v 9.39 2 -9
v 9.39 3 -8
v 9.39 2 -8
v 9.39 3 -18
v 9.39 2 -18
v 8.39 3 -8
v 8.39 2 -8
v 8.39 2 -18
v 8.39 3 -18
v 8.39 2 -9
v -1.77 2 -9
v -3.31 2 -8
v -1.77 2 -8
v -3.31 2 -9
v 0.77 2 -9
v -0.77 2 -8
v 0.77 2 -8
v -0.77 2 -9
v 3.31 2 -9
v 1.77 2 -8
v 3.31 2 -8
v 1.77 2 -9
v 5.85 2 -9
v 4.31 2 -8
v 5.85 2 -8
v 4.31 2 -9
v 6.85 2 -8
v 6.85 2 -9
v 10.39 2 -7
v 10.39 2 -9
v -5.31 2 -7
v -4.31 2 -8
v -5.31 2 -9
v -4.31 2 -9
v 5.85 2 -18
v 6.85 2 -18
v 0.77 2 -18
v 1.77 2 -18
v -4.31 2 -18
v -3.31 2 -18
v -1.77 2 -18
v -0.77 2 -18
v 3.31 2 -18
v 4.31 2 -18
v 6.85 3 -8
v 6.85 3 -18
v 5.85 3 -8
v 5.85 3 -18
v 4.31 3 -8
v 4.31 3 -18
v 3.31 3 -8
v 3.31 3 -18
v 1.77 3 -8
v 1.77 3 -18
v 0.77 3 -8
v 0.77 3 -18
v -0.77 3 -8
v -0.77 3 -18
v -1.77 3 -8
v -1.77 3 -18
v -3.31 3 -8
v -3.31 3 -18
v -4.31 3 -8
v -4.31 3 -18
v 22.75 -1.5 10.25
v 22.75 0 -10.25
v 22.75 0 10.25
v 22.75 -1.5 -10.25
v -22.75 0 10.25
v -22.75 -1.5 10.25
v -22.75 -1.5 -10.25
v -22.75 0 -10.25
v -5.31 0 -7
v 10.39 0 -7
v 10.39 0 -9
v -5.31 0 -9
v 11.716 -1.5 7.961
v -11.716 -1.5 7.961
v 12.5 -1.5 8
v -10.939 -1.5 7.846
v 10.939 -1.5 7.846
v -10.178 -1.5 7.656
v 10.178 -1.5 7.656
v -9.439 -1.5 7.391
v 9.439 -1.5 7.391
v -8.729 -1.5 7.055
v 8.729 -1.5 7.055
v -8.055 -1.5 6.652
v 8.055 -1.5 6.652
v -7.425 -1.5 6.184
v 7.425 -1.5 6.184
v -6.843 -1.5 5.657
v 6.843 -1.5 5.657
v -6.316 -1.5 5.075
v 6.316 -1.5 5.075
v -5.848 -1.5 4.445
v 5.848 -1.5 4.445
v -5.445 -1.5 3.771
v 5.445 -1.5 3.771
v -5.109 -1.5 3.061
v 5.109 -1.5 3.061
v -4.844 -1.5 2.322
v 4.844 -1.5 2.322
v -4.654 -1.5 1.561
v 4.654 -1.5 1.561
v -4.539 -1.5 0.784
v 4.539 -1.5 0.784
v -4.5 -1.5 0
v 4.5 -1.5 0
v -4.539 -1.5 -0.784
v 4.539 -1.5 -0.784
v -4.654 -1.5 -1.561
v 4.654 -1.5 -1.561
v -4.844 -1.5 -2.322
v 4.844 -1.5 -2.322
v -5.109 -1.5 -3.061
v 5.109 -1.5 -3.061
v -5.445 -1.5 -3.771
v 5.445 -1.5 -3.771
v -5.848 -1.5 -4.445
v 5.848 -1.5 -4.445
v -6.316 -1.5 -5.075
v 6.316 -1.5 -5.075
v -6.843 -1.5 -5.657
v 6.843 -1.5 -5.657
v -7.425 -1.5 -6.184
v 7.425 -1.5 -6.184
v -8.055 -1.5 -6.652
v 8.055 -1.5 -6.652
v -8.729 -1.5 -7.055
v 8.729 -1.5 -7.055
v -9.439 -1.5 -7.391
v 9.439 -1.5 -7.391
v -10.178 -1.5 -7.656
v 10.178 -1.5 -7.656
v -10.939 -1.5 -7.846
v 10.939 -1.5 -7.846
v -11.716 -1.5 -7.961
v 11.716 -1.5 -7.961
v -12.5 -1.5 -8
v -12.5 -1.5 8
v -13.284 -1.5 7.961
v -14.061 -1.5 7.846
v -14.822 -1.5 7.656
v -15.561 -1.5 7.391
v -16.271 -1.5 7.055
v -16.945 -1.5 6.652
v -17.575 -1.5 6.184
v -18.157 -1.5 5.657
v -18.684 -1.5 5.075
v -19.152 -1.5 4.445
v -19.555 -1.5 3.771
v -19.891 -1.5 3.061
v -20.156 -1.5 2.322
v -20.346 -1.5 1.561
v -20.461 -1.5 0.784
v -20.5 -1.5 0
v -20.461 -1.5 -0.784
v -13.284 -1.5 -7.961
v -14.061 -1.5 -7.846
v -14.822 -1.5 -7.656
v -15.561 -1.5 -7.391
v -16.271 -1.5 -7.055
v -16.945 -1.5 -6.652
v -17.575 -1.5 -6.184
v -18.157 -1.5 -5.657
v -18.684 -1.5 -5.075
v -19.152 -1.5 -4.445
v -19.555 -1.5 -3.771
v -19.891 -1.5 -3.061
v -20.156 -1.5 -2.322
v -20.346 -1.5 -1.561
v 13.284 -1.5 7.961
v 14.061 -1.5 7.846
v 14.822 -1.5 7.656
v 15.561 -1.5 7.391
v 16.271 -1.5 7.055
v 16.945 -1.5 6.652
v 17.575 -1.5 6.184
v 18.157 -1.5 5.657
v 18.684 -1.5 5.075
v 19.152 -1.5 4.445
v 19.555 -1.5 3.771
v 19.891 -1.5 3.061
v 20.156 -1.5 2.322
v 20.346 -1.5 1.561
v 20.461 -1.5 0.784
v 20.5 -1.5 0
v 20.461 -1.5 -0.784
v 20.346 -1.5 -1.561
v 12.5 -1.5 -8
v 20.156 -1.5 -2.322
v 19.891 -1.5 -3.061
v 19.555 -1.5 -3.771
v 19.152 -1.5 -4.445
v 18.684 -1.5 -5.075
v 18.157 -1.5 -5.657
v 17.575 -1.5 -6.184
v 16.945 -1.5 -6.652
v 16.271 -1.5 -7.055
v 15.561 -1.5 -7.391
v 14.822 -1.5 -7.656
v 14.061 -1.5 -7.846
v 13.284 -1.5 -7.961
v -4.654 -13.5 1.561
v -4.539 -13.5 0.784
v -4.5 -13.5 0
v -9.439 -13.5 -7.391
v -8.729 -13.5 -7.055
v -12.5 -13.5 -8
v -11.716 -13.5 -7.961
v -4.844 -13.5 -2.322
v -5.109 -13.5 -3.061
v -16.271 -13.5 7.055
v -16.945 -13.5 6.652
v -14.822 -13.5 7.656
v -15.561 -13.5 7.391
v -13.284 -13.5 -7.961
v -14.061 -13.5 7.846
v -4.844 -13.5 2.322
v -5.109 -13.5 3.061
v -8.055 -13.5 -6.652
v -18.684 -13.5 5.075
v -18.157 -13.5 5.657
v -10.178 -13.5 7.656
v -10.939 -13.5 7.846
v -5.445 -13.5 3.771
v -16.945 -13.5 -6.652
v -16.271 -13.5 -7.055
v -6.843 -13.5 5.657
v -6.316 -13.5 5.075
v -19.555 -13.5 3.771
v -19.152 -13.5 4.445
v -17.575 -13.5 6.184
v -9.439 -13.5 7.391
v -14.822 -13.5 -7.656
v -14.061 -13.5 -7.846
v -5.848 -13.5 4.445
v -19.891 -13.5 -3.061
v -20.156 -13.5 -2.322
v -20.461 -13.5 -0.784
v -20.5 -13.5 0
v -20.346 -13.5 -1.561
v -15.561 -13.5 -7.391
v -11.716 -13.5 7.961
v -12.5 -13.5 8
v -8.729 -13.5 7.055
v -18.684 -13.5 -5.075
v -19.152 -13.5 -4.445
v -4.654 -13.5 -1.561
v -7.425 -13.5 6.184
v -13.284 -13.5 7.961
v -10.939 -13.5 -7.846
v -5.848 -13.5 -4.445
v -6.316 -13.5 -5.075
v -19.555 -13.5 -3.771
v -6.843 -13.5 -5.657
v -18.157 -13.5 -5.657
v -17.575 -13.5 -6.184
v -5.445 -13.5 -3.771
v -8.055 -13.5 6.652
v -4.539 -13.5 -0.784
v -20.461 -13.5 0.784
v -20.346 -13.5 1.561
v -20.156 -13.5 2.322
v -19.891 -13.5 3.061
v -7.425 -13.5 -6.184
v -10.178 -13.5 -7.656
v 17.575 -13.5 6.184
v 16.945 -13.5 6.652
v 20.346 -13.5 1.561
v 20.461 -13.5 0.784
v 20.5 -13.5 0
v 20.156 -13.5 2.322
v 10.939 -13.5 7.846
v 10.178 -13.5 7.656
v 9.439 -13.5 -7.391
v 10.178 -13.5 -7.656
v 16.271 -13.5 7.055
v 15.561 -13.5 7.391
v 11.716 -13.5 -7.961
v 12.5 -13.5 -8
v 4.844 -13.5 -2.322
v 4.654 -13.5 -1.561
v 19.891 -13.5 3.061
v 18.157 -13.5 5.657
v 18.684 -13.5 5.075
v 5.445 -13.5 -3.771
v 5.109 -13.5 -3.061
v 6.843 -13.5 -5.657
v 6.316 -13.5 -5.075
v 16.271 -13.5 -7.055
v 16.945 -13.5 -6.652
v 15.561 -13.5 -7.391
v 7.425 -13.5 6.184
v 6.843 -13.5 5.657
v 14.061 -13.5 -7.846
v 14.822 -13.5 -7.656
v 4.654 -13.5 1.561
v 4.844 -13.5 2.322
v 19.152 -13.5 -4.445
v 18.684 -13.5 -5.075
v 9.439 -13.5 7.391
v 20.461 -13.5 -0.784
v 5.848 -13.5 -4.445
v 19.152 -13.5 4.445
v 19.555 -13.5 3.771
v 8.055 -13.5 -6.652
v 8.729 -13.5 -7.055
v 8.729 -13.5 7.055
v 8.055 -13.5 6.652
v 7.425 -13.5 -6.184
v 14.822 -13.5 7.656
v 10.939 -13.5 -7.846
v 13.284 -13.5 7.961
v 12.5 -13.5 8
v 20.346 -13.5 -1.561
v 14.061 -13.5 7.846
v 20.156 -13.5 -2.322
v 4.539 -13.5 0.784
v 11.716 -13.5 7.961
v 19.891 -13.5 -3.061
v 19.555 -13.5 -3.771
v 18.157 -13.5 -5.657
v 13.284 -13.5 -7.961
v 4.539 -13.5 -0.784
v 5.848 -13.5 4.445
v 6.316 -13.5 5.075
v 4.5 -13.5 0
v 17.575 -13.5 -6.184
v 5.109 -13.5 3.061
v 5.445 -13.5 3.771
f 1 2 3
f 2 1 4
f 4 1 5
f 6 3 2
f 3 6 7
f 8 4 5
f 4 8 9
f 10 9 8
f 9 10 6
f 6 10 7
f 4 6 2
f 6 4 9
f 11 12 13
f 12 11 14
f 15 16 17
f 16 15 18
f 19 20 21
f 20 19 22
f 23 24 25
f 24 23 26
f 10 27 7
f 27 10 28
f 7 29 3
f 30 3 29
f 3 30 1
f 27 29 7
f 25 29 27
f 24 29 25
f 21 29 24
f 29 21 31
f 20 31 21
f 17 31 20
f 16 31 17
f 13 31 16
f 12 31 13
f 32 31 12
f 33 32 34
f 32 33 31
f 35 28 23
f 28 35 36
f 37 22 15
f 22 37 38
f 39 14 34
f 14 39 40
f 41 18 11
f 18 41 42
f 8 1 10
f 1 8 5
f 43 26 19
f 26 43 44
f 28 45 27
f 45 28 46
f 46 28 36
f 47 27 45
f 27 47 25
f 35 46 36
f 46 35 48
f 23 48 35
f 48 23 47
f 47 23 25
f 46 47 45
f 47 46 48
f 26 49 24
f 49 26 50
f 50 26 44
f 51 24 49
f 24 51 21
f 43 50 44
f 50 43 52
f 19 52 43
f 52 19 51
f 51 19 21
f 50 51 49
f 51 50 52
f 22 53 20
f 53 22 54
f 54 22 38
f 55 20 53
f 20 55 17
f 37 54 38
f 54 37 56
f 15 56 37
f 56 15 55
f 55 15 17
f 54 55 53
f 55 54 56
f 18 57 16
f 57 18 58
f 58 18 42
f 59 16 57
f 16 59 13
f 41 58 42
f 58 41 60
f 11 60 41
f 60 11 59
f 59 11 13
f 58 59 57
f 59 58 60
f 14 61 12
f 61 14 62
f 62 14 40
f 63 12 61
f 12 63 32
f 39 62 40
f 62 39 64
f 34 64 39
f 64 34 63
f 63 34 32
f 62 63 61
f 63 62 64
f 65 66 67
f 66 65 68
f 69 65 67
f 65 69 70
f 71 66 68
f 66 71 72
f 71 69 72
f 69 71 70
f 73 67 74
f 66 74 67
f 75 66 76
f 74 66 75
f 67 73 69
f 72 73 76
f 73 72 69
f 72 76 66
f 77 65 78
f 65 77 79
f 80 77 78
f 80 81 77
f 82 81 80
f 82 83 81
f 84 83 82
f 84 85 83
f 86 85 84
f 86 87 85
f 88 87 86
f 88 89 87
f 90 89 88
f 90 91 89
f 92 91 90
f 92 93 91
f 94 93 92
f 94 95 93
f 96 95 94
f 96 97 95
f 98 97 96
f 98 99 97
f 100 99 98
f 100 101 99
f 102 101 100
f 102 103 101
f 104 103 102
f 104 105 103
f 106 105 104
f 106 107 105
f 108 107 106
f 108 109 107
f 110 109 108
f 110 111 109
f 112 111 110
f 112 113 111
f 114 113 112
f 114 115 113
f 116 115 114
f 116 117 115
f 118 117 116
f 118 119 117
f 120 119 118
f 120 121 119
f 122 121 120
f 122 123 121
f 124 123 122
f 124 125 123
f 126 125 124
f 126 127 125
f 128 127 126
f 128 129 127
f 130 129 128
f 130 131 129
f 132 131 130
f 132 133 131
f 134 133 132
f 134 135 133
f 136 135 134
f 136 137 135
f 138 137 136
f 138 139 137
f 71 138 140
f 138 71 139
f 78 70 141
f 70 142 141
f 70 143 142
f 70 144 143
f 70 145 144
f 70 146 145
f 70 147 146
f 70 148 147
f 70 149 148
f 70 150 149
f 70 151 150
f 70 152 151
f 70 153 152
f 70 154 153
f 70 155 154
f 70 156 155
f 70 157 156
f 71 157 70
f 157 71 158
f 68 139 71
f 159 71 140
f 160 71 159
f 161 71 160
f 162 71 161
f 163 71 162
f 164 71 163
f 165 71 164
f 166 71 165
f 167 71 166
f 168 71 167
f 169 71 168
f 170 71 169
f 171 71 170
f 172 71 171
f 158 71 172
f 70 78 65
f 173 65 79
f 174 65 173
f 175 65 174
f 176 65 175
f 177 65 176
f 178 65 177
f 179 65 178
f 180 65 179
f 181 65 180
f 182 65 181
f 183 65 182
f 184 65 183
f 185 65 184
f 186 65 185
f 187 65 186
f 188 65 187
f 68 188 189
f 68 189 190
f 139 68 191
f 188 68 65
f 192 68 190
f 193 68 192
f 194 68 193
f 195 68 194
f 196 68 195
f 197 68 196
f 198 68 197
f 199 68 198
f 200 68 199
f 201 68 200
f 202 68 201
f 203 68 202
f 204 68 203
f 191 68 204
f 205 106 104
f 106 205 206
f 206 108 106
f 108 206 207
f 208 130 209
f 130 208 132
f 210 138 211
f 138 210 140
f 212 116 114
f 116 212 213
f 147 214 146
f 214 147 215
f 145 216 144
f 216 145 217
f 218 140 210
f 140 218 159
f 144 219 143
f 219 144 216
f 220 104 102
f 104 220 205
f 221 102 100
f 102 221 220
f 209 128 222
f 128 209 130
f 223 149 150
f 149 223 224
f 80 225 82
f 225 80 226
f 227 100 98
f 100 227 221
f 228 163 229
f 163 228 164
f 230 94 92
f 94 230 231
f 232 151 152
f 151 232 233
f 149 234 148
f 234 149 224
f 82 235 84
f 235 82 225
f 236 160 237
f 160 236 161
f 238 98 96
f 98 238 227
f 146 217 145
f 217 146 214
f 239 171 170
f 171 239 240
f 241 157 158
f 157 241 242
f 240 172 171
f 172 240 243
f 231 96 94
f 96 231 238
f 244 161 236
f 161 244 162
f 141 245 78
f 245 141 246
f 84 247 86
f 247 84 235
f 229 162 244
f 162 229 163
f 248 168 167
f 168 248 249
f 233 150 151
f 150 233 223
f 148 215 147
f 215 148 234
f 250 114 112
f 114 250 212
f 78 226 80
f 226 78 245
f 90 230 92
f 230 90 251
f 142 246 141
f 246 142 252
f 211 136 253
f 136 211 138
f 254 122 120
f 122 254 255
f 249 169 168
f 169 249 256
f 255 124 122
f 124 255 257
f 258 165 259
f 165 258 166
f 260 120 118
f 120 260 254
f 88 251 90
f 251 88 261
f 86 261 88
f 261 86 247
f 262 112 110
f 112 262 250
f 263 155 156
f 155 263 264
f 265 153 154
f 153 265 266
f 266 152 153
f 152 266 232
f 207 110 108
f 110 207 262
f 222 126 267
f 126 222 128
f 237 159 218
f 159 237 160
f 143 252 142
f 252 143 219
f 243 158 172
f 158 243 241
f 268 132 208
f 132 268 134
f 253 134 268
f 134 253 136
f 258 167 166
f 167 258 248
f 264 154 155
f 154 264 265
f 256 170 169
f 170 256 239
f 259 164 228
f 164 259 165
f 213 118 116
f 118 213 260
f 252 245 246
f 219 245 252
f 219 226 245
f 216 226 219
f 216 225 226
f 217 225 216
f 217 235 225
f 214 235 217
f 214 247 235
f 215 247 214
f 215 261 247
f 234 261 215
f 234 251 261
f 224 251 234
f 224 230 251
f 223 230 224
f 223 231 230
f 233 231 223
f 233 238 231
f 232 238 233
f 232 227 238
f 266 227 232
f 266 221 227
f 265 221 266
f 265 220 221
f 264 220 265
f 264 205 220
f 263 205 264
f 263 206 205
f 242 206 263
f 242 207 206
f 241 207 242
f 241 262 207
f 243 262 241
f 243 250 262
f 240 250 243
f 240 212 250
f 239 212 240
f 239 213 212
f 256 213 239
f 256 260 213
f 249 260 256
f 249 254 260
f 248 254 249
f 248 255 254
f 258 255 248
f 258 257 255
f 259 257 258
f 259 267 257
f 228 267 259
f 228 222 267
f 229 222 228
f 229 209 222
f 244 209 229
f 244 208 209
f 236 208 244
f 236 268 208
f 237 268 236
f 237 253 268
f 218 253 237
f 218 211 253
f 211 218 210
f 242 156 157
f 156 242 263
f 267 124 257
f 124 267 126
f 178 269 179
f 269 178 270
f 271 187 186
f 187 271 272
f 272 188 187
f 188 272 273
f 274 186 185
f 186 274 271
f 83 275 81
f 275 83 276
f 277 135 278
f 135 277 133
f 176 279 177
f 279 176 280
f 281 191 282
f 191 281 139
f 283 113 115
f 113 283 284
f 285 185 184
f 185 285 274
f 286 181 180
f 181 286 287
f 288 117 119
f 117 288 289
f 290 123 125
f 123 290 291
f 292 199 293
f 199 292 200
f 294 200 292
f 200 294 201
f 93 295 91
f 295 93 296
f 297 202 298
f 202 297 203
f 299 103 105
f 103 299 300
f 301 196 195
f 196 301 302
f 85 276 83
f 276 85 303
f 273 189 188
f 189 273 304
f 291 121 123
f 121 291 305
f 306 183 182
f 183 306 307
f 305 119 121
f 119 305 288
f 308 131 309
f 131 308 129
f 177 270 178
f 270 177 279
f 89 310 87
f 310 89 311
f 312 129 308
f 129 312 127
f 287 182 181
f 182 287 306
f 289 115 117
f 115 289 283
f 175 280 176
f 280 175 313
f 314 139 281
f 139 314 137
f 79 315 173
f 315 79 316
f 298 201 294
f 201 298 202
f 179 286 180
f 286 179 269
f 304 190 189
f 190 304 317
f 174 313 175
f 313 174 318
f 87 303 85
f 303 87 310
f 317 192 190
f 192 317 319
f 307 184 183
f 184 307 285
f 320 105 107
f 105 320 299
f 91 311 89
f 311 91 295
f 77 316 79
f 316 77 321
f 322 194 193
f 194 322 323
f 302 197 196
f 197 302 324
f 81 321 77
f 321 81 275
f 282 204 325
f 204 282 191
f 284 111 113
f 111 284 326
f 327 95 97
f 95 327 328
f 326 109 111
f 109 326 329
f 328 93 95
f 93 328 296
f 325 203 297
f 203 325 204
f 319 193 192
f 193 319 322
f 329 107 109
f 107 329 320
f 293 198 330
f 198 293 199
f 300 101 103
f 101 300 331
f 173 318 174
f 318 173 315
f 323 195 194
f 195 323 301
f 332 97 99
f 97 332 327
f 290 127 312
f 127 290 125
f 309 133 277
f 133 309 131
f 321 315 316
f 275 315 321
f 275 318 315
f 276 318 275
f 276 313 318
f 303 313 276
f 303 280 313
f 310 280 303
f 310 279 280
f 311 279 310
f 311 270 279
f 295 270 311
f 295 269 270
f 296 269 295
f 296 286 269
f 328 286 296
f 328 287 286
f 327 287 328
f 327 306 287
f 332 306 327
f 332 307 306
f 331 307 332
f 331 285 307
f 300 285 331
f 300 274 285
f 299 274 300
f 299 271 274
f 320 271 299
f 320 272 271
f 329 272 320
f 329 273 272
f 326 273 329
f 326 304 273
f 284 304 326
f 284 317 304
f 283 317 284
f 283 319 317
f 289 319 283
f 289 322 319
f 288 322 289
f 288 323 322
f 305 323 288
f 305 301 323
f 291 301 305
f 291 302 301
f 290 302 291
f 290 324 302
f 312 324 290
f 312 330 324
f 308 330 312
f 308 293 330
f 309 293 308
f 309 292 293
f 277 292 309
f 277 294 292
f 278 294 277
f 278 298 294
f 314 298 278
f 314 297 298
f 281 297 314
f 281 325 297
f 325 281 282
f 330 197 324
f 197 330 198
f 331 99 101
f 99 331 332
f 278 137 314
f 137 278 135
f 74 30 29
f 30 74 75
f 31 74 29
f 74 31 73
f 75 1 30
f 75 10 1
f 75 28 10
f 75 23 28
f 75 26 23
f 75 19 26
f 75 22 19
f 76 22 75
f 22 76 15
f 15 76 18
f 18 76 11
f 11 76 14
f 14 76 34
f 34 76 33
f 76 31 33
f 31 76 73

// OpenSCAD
module us_sensor(tolerance=0) {
  color("green") translate([-45.5/2, -1.5, -20.5/2]) cube([45.5, 1.5, 20.5]);
  translate([-12.5,-1.5,0]) rotate([90,0,0]) color("gray") cylinder(d=16+tolerance, h=12, $fn=64);
  translate([12.5,-1.5,0]) rotate([90,0,0]) color("gray") cylinder(d=16+tolerance, h=12, $fn=64);
  start=3.81+2.54*2;
  for (x=[start:-2.54:-3.81]) {
    color("yellow") translate([x,0,0]) translate([-0.5, 2,-18]) cube([1,1,10]);
  }
  color([0.2,0.2,0.2]) translate([-3.81-1.5,-0,-9]) cube([3.81*2+2.54*2+3, 2, 2]);
}

us_sensor();
